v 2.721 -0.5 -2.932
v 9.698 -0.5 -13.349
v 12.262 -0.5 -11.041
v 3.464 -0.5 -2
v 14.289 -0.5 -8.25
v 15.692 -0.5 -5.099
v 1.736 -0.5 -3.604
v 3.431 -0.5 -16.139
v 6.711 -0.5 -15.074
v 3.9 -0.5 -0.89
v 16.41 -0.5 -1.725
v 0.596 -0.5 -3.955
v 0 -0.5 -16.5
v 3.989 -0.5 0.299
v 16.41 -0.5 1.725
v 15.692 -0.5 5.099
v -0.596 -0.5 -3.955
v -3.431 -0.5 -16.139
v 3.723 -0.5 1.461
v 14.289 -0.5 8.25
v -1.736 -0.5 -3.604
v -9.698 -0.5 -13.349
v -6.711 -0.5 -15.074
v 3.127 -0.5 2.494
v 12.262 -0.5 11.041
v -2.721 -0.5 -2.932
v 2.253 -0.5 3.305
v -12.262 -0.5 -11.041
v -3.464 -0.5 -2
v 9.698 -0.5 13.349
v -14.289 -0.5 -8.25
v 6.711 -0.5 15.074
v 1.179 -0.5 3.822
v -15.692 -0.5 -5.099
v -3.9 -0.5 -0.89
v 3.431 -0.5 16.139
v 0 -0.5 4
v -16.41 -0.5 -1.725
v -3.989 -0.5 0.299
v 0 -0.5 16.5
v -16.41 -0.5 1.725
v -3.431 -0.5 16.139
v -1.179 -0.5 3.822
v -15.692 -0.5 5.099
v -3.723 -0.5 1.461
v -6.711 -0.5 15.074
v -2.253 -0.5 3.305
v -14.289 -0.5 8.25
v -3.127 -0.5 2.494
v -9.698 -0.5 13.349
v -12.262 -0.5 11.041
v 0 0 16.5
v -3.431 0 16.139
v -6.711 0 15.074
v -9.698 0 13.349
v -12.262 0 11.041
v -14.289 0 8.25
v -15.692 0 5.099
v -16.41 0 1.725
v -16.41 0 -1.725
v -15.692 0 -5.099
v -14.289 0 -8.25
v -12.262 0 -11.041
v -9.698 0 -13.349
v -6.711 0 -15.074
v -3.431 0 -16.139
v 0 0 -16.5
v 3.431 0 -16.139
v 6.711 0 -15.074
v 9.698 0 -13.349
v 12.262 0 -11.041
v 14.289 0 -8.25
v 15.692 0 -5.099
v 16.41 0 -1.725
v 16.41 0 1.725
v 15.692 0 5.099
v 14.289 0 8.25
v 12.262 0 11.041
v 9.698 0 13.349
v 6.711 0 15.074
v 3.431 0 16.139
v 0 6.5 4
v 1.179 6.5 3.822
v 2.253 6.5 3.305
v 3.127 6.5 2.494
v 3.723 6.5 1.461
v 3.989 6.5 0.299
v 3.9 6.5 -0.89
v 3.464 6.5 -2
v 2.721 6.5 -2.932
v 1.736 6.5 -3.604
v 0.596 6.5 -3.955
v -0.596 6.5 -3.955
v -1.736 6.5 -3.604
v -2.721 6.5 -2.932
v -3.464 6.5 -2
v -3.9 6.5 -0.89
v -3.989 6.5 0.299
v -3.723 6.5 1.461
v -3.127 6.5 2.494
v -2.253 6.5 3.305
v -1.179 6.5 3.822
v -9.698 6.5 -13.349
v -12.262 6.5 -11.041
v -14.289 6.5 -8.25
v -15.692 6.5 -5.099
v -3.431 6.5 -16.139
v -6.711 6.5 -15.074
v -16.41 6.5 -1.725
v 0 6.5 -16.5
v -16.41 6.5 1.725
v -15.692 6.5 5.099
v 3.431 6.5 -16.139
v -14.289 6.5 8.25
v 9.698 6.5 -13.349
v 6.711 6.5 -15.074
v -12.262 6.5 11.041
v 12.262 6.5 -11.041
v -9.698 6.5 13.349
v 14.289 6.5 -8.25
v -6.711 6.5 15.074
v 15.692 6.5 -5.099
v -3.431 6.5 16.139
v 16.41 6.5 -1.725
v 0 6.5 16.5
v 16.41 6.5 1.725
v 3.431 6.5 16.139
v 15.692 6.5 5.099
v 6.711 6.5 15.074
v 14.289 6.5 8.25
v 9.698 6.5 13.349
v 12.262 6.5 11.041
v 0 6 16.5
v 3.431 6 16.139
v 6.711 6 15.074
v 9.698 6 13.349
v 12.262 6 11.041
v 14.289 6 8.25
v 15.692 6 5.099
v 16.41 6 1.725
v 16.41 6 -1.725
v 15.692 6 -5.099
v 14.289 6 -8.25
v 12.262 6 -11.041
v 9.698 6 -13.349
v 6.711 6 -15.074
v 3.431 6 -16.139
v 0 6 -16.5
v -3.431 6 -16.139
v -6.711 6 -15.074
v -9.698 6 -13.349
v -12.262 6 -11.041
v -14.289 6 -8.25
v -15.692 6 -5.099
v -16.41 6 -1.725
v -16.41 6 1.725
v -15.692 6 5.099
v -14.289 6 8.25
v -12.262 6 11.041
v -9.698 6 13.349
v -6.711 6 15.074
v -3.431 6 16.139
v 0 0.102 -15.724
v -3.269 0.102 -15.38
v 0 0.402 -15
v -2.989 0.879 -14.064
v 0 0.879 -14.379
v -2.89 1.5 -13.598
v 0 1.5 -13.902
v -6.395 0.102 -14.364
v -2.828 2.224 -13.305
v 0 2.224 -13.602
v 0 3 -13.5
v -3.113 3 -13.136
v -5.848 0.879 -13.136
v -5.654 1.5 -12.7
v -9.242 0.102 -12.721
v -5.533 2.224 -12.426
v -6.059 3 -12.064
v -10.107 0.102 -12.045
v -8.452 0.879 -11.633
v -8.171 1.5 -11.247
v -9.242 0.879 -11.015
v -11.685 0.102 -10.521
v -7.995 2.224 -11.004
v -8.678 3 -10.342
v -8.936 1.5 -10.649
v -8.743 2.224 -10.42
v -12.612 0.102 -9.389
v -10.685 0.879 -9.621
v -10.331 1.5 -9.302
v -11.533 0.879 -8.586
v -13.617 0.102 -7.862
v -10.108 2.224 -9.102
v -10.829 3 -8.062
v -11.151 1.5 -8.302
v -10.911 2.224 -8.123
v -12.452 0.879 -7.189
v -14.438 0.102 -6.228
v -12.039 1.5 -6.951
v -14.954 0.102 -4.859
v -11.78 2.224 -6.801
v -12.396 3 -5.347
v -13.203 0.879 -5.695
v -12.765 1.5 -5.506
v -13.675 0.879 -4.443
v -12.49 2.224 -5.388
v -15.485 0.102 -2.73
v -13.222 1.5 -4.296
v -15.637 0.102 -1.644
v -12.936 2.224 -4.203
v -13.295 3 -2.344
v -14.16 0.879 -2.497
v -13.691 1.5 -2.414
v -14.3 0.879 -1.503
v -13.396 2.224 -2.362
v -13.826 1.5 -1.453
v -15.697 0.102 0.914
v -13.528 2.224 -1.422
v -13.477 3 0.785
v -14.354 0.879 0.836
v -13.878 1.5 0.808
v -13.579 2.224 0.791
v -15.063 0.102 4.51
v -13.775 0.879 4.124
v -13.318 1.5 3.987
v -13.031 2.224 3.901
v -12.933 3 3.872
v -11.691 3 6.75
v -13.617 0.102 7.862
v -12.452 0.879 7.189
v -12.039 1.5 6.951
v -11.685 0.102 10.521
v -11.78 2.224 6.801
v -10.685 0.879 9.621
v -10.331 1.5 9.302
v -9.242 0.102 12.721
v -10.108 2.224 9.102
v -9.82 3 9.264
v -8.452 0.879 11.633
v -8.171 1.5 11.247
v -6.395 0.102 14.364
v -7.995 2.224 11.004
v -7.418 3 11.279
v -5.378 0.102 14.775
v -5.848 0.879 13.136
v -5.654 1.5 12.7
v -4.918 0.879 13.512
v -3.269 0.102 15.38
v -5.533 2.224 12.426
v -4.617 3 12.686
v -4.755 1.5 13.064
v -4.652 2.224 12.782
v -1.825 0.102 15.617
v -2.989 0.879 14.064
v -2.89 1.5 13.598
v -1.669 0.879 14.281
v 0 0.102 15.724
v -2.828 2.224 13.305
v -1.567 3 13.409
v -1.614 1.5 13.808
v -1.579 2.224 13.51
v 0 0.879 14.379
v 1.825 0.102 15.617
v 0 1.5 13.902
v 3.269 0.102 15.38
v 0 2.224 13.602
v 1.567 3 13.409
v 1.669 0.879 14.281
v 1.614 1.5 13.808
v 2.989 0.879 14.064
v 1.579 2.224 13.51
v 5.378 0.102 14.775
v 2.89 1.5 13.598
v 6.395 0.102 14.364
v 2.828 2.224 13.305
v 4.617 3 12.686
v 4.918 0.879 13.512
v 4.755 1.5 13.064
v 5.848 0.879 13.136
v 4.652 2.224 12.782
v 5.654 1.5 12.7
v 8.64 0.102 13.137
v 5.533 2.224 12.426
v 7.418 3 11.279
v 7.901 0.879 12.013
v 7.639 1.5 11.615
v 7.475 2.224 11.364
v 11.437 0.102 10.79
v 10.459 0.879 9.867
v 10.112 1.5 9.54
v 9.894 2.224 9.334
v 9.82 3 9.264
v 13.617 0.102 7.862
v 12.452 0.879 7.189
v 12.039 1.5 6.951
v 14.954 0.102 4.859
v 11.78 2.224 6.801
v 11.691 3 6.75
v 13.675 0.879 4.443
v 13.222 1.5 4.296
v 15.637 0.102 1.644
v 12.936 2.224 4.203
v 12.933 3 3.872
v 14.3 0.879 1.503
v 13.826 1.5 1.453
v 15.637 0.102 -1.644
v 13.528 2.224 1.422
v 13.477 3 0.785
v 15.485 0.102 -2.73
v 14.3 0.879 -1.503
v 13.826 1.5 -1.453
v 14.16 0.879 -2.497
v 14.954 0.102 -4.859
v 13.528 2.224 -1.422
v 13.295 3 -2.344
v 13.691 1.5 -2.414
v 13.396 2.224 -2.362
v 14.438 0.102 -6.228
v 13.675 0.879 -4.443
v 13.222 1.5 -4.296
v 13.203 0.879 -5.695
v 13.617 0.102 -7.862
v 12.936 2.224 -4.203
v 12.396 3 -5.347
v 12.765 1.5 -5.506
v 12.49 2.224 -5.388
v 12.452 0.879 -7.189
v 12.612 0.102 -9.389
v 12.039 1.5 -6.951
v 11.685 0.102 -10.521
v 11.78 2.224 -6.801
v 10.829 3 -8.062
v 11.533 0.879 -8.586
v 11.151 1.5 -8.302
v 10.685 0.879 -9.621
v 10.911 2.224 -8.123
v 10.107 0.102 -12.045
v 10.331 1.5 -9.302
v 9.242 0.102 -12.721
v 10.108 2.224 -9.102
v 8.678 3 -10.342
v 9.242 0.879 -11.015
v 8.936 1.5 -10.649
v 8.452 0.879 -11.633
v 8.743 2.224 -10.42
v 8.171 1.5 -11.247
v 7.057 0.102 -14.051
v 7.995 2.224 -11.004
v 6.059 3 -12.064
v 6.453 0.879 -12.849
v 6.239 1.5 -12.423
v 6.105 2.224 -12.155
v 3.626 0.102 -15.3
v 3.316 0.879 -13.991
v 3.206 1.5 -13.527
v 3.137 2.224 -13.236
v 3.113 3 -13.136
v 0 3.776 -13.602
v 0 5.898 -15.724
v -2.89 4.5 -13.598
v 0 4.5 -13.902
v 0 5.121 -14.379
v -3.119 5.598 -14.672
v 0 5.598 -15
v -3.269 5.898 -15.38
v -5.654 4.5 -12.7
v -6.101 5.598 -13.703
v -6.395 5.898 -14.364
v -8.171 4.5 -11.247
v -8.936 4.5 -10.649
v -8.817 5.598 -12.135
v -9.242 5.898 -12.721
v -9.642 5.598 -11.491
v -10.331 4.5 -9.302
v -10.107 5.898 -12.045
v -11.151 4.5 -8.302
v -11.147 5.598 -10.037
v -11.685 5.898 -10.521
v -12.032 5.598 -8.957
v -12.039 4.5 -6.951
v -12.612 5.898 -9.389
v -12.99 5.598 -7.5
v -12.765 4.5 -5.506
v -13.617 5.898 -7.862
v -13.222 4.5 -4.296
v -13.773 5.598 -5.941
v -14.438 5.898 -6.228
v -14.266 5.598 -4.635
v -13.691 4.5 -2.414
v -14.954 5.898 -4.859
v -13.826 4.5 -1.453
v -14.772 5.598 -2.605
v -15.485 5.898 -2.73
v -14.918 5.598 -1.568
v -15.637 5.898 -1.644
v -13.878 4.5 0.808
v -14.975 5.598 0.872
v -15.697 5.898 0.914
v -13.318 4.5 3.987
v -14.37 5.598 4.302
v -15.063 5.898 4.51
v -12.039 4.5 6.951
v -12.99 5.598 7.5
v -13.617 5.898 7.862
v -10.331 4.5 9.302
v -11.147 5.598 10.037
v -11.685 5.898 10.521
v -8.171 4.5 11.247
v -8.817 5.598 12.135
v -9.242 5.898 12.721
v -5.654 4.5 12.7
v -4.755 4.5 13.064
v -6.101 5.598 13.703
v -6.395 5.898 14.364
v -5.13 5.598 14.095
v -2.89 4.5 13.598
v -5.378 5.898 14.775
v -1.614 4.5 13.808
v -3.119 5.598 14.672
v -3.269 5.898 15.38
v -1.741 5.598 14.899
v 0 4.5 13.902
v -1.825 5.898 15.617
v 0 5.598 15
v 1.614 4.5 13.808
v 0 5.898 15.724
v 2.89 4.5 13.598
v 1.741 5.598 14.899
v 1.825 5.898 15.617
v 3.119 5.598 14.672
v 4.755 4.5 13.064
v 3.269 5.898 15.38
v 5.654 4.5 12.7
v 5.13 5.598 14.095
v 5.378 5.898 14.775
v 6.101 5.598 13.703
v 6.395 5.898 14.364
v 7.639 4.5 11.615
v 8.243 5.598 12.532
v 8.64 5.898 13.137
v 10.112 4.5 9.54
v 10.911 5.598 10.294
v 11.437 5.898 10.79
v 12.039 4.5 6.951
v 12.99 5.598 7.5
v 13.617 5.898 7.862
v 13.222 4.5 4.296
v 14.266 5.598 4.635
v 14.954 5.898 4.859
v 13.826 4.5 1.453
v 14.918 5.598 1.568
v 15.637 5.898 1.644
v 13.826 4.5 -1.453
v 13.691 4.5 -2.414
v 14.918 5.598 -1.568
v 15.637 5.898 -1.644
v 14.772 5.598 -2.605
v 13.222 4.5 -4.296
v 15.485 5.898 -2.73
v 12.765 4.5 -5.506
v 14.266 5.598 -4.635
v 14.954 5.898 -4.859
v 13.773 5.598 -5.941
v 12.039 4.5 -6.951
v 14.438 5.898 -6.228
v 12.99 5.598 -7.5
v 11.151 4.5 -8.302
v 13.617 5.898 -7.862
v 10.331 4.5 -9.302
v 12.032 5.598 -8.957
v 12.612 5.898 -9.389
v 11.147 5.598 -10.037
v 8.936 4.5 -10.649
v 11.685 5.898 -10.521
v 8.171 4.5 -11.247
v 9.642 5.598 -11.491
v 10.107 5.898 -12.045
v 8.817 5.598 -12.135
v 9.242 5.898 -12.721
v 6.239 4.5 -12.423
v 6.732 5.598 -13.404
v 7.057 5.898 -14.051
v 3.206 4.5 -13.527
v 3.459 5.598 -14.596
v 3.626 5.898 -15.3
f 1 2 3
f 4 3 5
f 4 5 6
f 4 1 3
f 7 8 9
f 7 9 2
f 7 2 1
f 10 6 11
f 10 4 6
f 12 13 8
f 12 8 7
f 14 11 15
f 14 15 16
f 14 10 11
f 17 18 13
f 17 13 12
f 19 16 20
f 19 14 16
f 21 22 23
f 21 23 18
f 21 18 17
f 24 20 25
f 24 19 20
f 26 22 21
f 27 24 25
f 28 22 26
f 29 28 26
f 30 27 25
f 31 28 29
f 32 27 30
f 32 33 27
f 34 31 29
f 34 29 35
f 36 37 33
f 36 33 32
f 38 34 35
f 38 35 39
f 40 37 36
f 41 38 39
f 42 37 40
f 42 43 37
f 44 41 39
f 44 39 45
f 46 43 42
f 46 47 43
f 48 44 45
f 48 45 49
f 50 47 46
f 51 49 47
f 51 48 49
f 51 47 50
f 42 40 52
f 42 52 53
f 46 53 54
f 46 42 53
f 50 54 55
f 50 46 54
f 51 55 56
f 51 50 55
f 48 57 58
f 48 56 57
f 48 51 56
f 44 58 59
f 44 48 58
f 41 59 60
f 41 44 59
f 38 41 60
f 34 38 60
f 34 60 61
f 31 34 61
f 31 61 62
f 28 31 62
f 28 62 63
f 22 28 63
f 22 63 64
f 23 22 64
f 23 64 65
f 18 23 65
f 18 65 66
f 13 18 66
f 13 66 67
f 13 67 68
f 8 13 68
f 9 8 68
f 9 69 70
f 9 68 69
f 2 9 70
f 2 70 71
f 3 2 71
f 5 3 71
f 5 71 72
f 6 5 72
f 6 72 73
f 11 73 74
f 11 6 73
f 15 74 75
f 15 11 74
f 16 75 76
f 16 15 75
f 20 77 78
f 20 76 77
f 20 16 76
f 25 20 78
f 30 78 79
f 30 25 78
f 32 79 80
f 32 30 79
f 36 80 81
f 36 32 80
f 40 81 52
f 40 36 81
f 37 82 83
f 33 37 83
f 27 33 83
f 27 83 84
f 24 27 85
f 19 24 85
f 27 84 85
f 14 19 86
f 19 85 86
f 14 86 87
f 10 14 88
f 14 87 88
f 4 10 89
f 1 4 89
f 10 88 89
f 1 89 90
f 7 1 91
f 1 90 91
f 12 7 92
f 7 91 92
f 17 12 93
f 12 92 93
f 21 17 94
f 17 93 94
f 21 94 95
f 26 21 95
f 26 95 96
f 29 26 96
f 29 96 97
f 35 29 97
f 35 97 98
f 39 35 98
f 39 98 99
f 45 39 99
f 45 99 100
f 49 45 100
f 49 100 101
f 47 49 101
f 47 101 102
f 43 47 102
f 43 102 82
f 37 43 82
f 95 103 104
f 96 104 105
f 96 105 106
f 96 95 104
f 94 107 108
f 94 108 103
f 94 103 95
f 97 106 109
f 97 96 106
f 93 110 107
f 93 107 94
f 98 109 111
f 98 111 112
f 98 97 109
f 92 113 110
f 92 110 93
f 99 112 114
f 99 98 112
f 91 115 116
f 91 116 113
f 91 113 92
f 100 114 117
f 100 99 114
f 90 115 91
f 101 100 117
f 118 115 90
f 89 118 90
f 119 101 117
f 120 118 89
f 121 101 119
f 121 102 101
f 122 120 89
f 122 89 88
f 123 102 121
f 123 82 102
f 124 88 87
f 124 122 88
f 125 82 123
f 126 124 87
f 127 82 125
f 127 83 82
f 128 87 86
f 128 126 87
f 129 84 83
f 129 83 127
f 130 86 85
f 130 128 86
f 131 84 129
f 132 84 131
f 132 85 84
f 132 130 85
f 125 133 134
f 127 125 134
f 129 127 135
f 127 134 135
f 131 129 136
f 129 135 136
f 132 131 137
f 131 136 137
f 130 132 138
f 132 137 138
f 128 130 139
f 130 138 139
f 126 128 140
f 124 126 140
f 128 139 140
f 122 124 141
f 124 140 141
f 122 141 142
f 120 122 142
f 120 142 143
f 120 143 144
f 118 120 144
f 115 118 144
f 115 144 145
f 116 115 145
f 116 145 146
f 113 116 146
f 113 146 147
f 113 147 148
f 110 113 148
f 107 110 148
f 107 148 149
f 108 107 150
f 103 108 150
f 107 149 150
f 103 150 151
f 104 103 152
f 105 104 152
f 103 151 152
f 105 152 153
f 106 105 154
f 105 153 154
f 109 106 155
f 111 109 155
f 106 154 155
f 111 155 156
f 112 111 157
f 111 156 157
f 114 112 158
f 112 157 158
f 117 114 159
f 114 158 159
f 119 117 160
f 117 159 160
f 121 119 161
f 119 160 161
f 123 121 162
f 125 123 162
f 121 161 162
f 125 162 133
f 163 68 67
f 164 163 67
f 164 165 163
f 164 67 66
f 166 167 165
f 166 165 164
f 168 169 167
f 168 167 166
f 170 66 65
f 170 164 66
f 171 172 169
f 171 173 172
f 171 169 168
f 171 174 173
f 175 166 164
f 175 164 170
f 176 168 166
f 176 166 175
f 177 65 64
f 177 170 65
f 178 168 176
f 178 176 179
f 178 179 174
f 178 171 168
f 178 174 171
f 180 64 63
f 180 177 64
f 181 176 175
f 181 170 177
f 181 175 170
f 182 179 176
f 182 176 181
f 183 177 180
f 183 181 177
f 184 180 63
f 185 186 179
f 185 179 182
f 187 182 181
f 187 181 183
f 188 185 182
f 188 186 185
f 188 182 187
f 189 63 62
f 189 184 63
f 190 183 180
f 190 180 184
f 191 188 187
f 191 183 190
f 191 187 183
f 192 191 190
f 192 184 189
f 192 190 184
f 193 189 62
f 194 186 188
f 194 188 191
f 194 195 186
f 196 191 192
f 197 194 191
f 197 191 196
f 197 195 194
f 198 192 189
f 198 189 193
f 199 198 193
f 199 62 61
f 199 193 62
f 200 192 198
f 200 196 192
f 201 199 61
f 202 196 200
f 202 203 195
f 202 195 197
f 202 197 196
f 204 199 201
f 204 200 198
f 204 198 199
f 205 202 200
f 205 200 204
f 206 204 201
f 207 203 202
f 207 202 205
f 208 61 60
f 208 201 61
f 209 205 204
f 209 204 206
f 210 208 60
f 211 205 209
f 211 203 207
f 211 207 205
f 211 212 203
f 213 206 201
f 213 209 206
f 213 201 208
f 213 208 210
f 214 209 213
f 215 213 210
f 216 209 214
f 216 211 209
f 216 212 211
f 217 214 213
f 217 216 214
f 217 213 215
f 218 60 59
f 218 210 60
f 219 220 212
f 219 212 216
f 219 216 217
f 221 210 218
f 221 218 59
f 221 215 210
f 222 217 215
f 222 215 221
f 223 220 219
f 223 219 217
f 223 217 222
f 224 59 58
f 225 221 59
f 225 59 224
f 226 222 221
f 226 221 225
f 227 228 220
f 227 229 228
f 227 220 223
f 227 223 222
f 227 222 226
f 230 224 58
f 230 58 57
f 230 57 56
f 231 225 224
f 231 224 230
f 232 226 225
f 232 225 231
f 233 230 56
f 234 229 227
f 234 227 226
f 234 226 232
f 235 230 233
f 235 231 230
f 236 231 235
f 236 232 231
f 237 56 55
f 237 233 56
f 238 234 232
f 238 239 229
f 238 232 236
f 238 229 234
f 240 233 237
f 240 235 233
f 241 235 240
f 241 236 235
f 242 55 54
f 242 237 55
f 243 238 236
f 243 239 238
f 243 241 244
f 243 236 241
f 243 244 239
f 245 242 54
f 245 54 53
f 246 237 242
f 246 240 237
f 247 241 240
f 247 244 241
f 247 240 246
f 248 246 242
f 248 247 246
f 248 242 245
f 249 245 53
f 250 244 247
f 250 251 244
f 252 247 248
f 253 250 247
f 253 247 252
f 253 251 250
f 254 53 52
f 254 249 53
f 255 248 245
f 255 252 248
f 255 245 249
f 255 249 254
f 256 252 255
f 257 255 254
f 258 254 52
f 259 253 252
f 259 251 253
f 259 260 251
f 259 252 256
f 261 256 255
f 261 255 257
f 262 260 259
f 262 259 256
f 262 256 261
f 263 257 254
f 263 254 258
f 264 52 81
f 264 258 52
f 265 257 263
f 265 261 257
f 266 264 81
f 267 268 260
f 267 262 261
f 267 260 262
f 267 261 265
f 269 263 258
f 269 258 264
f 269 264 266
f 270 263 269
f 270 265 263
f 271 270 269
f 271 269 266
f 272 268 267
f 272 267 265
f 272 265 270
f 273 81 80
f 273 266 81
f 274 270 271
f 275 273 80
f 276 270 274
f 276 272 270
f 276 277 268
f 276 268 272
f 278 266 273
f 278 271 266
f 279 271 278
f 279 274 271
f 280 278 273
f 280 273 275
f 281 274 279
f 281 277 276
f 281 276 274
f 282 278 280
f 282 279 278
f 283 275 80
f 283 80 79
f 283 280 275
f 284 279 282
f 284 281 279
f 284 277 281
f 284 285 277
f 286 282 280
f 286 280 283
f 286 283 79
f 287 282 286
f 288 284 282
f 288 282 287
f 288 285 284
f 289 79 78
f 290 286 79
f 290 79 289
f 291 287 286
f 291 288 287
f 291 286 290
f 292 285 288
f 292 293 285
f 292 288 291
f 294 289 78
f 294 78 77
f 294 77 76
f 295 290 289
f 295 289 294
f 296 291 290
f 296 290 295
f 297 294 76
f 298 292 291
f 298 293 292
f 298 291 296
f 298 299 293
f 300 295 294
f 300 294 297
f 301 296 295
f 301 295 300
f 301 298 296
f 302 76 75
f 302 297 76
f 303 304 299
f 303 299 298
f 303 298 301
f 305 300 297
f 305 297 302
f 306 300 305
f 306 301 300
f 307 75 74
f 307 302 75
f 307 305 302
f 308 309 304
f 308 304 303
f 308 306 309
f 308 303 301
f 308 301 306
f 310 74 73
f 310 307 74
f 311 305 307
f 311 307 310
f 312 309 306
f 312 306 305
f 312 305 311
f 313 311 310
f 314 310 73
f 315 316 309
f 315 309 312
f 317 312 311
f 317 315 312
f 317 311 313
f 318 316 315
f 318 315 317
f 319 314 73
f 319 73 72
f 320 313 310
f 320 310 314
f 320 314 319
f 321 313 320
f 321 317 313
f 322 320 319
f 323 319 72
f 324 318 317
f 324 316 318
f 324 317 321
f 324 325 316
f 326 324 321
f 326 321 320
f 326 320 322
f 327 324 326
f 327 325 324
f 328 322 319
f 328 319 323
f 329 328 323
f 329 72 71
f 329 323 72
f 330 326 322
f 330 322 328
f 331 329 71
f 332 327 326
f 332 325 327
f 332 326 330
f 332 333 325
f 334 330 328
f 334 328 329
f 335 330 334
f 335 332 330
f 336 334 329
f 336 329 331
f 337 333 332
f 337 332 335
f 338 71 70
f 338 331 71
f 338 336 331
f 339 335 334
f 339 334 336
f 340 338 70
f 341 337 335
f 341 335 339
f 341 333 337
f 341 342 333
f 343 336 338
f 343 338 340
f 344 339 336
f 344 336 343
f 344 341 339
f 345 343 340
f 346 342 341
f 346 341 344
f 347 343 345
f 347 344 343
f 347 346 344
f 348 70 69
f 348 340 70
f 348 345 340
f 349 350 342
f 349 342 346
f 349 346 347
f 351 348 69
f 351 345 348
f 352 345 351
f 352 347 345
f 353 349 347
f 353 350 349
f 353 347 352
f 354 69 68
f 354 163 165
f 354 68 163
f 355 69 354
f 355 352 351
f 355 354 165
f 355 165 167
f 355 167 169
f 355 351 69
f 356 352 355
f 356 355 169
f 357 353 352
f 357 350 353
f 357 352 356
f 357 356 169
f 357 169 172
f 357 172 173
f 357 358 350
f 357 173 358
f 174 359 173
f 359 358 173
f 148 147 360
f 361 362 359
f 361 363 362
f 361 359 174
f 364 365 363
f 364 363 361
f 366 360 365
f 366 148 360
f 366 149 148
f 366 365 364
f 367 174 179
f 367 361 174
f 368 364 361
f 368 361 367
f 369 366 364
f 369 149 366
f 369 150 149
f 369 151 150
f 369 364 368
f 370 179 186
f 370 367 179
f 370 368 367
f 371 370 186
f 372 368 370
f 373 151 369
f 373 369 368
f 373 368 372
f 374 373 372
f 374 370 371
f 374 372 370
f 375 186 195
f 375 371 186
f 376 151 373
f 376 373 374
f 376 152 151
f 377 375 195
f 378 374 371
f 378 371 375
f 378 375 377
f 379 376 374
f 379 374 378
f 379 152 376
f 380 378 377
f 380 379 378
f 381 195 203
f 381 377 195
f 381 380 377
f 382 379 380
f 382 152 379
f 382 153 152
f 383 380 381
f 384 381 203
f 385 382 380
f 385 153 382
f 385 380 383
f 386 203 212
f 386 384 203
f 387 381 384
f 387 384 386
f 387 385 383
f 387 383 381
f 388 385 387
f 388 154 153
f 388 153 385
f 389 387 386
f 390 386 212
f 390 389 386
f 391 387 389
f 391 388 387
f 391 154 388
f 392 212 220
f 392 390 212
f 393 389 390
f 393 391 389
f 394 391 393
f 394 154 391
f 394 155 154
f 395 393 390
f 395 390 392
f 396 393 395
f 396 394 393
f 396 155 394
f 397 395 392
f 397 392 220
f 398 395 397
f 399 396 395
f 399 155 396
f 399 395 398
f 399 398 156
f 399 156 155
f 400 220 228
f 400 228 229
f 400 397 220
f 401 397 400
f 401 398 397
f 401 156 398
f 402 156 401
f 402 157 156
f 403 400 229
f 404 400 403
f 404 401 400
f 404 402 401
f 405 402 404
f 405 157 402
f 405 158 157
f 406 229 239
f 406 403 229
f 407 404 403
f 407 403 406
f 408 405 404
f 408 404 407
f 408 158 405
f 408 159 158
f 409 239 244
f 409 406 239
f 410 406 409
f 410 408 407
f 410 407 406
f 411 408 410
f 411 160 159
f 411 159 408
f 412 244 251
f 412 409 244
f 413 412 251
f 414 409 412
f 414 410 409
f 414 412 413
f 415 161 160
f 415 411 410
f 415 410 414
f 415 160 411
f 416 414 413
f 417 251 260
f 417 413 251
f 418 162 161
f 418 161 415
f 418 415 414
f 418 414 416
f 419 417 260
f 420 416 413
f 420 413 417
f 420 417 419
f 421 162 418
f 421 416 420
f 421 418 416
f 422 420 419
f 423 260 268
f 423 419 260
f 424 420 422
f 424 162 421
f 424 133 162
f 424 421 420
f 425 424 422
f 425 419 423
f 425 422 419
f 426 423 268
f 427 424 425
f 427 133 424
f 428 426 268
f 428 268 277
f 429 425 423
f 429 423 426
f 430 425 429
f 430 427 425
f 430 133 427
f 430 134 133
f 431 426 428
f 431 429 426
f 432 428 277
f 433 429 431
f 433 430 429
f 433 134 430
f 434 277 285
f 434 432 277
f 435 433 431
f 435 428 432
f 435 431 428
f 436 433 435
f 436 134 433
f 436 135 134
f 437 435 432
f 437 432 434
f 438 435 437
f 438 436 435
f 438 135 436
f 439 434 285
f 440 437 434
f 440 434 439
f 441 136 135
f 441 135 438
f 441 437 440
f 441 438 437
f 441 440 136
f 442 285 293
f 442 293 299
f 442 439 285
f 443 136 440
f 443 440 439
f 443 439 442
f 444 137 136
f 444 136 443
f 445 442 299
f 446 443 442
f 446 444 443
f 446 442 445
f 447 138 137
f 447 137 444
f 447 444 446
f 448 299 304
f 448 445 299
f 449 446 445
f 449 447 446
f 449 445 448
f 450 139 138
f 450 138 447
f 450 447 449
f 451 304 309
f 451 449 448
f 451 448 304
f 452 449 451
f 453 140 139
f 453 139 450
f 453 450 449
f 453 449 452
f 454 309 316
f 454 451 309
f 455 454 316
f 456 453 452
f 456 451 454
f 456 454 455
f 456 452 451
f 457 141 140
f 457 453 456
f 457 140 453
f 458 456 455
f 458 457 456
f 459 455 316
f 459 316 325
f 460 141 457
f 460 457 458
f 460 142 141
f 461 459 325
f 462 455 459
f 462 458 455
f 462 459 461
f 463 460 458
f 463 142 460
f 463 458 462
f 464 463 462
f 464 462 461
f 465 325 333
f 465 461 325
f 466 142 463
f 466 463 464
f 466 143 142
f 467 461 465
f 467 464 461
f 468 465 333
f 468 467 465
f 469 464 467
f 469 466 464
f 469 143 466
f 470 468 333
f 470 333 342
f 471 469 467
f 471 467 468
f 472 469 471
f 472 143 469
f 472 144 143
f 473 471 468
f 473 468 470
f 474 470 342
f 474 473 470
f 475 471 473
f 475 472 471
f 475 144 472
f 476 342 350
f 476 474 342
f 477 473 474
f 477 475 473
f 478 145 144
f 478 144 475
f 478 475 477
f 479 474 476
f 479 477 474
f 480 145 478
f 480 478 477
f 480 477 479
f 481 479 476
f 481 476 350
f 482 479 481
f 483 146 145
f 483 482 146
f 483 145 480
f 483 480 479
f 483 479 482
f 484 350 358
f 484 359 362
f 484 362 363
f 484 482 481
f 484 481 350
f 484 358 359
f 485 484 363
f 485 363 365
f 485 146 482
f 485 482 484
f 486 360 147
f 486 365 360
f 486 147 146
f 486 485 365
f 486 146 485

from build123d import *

# Parameters (mm, degrees)
SKETCH2_R           = 16.5
BOSS_EXTRUDE1_DEPTH = 0.5
BOSS_EXTRUDE2_START = 0.5
SKETCH3_R           = 16.5
BOSS_EXTRUDE2_DEPTH = 0.5
SKETCH4_R           = 1
CUT_EXTRUDE1_DEPTH  = 7
SKETCH5_R           = 4
CUT_EXTRUDE2_DEPTH  = 10


with BuildPart() as part:
    # Sketch1 → Revolve1 (revolve)
    with BuildSketch(Plane.XY, mode=Mode.PRIVATE) as revolve1_sk:
        Polygon((0, 6), (0, 0), (13.5, 0), (13.5, 3), (13.5, 6), align=None)
        with BuildLine():
            Line((13.5, 6), (13.5, 3))
            ThreePointArc((13.5, 3), (14.378679656, 5.121320344), (16.5, 6))
            Line((16.5, 6), (13.5, 6))
        make_face()
        with BuildLine():
            Line((13.5, 3), (13.5, 0))
            Line((13.5, 0), (16.5, 0))
            ThreePointArc((16.5, 0), (14.378679656, 0.878679656), (13.5, 3))
        make_face()
    revolve(revolve1_sk.sketch.rotate(Axis((0, 0, 0), (0, 1, 0)), 90), axis=Axis((0, 0, 0), (0, 1, 0)))

    # Sketch2 → Boss-Extrude1 (add)
    with BuildSketch(Plane(origin=(0, 6, 0), x_dir=(1, 0, 0), z_dir=(0, 1, 0))):
        with Locations(Location((0, 0, 0), (0, 0, 270))):
            Circle(SKETCH2_R)
    extrude(amount=BOSS_EXTRUDE1_DEPTH)

    # Sketch3 → Boss-Extrude2 (add)
    with BuildSketch(Plane.XZ.offset(BOSS_EXTRUDE2_START)):
        with Locations(Location((0, 0, 0), (0, 0, 90))):
            Circle(SKETCH3_R)
    extrude(amount=-BOSS_EXTRUDE2_DEPTH)

    # Sketch4 → Cut-Extrude1 (cut)
    with BuildSketch(Plane.XZ.offset(0.5)):
        with Locations(Location((0, 0, 0), (0, 0, 270))):
            Circle(SKETCH4_R)
    extrude(amount=-CUT_EXTRUDE1_DEPTH, mode=Mode.SUBTRACT)

    # Sketch5 → Cut-Extrude2 (cut)
    with BuildSketch(Plane(origin=(0, 6.5, 0), x_dir=(1, 0, 0), z_dir=(0, 1, 0))):
        with Locations(Location((0, 0, 0), (0, 0, 270))):
            Circle(SKETCH5_R)
    extrude(amount=-CUT_EXTRUDE2_DEPTH, mode=Mode.SUBTRACT)


solid = part.part
